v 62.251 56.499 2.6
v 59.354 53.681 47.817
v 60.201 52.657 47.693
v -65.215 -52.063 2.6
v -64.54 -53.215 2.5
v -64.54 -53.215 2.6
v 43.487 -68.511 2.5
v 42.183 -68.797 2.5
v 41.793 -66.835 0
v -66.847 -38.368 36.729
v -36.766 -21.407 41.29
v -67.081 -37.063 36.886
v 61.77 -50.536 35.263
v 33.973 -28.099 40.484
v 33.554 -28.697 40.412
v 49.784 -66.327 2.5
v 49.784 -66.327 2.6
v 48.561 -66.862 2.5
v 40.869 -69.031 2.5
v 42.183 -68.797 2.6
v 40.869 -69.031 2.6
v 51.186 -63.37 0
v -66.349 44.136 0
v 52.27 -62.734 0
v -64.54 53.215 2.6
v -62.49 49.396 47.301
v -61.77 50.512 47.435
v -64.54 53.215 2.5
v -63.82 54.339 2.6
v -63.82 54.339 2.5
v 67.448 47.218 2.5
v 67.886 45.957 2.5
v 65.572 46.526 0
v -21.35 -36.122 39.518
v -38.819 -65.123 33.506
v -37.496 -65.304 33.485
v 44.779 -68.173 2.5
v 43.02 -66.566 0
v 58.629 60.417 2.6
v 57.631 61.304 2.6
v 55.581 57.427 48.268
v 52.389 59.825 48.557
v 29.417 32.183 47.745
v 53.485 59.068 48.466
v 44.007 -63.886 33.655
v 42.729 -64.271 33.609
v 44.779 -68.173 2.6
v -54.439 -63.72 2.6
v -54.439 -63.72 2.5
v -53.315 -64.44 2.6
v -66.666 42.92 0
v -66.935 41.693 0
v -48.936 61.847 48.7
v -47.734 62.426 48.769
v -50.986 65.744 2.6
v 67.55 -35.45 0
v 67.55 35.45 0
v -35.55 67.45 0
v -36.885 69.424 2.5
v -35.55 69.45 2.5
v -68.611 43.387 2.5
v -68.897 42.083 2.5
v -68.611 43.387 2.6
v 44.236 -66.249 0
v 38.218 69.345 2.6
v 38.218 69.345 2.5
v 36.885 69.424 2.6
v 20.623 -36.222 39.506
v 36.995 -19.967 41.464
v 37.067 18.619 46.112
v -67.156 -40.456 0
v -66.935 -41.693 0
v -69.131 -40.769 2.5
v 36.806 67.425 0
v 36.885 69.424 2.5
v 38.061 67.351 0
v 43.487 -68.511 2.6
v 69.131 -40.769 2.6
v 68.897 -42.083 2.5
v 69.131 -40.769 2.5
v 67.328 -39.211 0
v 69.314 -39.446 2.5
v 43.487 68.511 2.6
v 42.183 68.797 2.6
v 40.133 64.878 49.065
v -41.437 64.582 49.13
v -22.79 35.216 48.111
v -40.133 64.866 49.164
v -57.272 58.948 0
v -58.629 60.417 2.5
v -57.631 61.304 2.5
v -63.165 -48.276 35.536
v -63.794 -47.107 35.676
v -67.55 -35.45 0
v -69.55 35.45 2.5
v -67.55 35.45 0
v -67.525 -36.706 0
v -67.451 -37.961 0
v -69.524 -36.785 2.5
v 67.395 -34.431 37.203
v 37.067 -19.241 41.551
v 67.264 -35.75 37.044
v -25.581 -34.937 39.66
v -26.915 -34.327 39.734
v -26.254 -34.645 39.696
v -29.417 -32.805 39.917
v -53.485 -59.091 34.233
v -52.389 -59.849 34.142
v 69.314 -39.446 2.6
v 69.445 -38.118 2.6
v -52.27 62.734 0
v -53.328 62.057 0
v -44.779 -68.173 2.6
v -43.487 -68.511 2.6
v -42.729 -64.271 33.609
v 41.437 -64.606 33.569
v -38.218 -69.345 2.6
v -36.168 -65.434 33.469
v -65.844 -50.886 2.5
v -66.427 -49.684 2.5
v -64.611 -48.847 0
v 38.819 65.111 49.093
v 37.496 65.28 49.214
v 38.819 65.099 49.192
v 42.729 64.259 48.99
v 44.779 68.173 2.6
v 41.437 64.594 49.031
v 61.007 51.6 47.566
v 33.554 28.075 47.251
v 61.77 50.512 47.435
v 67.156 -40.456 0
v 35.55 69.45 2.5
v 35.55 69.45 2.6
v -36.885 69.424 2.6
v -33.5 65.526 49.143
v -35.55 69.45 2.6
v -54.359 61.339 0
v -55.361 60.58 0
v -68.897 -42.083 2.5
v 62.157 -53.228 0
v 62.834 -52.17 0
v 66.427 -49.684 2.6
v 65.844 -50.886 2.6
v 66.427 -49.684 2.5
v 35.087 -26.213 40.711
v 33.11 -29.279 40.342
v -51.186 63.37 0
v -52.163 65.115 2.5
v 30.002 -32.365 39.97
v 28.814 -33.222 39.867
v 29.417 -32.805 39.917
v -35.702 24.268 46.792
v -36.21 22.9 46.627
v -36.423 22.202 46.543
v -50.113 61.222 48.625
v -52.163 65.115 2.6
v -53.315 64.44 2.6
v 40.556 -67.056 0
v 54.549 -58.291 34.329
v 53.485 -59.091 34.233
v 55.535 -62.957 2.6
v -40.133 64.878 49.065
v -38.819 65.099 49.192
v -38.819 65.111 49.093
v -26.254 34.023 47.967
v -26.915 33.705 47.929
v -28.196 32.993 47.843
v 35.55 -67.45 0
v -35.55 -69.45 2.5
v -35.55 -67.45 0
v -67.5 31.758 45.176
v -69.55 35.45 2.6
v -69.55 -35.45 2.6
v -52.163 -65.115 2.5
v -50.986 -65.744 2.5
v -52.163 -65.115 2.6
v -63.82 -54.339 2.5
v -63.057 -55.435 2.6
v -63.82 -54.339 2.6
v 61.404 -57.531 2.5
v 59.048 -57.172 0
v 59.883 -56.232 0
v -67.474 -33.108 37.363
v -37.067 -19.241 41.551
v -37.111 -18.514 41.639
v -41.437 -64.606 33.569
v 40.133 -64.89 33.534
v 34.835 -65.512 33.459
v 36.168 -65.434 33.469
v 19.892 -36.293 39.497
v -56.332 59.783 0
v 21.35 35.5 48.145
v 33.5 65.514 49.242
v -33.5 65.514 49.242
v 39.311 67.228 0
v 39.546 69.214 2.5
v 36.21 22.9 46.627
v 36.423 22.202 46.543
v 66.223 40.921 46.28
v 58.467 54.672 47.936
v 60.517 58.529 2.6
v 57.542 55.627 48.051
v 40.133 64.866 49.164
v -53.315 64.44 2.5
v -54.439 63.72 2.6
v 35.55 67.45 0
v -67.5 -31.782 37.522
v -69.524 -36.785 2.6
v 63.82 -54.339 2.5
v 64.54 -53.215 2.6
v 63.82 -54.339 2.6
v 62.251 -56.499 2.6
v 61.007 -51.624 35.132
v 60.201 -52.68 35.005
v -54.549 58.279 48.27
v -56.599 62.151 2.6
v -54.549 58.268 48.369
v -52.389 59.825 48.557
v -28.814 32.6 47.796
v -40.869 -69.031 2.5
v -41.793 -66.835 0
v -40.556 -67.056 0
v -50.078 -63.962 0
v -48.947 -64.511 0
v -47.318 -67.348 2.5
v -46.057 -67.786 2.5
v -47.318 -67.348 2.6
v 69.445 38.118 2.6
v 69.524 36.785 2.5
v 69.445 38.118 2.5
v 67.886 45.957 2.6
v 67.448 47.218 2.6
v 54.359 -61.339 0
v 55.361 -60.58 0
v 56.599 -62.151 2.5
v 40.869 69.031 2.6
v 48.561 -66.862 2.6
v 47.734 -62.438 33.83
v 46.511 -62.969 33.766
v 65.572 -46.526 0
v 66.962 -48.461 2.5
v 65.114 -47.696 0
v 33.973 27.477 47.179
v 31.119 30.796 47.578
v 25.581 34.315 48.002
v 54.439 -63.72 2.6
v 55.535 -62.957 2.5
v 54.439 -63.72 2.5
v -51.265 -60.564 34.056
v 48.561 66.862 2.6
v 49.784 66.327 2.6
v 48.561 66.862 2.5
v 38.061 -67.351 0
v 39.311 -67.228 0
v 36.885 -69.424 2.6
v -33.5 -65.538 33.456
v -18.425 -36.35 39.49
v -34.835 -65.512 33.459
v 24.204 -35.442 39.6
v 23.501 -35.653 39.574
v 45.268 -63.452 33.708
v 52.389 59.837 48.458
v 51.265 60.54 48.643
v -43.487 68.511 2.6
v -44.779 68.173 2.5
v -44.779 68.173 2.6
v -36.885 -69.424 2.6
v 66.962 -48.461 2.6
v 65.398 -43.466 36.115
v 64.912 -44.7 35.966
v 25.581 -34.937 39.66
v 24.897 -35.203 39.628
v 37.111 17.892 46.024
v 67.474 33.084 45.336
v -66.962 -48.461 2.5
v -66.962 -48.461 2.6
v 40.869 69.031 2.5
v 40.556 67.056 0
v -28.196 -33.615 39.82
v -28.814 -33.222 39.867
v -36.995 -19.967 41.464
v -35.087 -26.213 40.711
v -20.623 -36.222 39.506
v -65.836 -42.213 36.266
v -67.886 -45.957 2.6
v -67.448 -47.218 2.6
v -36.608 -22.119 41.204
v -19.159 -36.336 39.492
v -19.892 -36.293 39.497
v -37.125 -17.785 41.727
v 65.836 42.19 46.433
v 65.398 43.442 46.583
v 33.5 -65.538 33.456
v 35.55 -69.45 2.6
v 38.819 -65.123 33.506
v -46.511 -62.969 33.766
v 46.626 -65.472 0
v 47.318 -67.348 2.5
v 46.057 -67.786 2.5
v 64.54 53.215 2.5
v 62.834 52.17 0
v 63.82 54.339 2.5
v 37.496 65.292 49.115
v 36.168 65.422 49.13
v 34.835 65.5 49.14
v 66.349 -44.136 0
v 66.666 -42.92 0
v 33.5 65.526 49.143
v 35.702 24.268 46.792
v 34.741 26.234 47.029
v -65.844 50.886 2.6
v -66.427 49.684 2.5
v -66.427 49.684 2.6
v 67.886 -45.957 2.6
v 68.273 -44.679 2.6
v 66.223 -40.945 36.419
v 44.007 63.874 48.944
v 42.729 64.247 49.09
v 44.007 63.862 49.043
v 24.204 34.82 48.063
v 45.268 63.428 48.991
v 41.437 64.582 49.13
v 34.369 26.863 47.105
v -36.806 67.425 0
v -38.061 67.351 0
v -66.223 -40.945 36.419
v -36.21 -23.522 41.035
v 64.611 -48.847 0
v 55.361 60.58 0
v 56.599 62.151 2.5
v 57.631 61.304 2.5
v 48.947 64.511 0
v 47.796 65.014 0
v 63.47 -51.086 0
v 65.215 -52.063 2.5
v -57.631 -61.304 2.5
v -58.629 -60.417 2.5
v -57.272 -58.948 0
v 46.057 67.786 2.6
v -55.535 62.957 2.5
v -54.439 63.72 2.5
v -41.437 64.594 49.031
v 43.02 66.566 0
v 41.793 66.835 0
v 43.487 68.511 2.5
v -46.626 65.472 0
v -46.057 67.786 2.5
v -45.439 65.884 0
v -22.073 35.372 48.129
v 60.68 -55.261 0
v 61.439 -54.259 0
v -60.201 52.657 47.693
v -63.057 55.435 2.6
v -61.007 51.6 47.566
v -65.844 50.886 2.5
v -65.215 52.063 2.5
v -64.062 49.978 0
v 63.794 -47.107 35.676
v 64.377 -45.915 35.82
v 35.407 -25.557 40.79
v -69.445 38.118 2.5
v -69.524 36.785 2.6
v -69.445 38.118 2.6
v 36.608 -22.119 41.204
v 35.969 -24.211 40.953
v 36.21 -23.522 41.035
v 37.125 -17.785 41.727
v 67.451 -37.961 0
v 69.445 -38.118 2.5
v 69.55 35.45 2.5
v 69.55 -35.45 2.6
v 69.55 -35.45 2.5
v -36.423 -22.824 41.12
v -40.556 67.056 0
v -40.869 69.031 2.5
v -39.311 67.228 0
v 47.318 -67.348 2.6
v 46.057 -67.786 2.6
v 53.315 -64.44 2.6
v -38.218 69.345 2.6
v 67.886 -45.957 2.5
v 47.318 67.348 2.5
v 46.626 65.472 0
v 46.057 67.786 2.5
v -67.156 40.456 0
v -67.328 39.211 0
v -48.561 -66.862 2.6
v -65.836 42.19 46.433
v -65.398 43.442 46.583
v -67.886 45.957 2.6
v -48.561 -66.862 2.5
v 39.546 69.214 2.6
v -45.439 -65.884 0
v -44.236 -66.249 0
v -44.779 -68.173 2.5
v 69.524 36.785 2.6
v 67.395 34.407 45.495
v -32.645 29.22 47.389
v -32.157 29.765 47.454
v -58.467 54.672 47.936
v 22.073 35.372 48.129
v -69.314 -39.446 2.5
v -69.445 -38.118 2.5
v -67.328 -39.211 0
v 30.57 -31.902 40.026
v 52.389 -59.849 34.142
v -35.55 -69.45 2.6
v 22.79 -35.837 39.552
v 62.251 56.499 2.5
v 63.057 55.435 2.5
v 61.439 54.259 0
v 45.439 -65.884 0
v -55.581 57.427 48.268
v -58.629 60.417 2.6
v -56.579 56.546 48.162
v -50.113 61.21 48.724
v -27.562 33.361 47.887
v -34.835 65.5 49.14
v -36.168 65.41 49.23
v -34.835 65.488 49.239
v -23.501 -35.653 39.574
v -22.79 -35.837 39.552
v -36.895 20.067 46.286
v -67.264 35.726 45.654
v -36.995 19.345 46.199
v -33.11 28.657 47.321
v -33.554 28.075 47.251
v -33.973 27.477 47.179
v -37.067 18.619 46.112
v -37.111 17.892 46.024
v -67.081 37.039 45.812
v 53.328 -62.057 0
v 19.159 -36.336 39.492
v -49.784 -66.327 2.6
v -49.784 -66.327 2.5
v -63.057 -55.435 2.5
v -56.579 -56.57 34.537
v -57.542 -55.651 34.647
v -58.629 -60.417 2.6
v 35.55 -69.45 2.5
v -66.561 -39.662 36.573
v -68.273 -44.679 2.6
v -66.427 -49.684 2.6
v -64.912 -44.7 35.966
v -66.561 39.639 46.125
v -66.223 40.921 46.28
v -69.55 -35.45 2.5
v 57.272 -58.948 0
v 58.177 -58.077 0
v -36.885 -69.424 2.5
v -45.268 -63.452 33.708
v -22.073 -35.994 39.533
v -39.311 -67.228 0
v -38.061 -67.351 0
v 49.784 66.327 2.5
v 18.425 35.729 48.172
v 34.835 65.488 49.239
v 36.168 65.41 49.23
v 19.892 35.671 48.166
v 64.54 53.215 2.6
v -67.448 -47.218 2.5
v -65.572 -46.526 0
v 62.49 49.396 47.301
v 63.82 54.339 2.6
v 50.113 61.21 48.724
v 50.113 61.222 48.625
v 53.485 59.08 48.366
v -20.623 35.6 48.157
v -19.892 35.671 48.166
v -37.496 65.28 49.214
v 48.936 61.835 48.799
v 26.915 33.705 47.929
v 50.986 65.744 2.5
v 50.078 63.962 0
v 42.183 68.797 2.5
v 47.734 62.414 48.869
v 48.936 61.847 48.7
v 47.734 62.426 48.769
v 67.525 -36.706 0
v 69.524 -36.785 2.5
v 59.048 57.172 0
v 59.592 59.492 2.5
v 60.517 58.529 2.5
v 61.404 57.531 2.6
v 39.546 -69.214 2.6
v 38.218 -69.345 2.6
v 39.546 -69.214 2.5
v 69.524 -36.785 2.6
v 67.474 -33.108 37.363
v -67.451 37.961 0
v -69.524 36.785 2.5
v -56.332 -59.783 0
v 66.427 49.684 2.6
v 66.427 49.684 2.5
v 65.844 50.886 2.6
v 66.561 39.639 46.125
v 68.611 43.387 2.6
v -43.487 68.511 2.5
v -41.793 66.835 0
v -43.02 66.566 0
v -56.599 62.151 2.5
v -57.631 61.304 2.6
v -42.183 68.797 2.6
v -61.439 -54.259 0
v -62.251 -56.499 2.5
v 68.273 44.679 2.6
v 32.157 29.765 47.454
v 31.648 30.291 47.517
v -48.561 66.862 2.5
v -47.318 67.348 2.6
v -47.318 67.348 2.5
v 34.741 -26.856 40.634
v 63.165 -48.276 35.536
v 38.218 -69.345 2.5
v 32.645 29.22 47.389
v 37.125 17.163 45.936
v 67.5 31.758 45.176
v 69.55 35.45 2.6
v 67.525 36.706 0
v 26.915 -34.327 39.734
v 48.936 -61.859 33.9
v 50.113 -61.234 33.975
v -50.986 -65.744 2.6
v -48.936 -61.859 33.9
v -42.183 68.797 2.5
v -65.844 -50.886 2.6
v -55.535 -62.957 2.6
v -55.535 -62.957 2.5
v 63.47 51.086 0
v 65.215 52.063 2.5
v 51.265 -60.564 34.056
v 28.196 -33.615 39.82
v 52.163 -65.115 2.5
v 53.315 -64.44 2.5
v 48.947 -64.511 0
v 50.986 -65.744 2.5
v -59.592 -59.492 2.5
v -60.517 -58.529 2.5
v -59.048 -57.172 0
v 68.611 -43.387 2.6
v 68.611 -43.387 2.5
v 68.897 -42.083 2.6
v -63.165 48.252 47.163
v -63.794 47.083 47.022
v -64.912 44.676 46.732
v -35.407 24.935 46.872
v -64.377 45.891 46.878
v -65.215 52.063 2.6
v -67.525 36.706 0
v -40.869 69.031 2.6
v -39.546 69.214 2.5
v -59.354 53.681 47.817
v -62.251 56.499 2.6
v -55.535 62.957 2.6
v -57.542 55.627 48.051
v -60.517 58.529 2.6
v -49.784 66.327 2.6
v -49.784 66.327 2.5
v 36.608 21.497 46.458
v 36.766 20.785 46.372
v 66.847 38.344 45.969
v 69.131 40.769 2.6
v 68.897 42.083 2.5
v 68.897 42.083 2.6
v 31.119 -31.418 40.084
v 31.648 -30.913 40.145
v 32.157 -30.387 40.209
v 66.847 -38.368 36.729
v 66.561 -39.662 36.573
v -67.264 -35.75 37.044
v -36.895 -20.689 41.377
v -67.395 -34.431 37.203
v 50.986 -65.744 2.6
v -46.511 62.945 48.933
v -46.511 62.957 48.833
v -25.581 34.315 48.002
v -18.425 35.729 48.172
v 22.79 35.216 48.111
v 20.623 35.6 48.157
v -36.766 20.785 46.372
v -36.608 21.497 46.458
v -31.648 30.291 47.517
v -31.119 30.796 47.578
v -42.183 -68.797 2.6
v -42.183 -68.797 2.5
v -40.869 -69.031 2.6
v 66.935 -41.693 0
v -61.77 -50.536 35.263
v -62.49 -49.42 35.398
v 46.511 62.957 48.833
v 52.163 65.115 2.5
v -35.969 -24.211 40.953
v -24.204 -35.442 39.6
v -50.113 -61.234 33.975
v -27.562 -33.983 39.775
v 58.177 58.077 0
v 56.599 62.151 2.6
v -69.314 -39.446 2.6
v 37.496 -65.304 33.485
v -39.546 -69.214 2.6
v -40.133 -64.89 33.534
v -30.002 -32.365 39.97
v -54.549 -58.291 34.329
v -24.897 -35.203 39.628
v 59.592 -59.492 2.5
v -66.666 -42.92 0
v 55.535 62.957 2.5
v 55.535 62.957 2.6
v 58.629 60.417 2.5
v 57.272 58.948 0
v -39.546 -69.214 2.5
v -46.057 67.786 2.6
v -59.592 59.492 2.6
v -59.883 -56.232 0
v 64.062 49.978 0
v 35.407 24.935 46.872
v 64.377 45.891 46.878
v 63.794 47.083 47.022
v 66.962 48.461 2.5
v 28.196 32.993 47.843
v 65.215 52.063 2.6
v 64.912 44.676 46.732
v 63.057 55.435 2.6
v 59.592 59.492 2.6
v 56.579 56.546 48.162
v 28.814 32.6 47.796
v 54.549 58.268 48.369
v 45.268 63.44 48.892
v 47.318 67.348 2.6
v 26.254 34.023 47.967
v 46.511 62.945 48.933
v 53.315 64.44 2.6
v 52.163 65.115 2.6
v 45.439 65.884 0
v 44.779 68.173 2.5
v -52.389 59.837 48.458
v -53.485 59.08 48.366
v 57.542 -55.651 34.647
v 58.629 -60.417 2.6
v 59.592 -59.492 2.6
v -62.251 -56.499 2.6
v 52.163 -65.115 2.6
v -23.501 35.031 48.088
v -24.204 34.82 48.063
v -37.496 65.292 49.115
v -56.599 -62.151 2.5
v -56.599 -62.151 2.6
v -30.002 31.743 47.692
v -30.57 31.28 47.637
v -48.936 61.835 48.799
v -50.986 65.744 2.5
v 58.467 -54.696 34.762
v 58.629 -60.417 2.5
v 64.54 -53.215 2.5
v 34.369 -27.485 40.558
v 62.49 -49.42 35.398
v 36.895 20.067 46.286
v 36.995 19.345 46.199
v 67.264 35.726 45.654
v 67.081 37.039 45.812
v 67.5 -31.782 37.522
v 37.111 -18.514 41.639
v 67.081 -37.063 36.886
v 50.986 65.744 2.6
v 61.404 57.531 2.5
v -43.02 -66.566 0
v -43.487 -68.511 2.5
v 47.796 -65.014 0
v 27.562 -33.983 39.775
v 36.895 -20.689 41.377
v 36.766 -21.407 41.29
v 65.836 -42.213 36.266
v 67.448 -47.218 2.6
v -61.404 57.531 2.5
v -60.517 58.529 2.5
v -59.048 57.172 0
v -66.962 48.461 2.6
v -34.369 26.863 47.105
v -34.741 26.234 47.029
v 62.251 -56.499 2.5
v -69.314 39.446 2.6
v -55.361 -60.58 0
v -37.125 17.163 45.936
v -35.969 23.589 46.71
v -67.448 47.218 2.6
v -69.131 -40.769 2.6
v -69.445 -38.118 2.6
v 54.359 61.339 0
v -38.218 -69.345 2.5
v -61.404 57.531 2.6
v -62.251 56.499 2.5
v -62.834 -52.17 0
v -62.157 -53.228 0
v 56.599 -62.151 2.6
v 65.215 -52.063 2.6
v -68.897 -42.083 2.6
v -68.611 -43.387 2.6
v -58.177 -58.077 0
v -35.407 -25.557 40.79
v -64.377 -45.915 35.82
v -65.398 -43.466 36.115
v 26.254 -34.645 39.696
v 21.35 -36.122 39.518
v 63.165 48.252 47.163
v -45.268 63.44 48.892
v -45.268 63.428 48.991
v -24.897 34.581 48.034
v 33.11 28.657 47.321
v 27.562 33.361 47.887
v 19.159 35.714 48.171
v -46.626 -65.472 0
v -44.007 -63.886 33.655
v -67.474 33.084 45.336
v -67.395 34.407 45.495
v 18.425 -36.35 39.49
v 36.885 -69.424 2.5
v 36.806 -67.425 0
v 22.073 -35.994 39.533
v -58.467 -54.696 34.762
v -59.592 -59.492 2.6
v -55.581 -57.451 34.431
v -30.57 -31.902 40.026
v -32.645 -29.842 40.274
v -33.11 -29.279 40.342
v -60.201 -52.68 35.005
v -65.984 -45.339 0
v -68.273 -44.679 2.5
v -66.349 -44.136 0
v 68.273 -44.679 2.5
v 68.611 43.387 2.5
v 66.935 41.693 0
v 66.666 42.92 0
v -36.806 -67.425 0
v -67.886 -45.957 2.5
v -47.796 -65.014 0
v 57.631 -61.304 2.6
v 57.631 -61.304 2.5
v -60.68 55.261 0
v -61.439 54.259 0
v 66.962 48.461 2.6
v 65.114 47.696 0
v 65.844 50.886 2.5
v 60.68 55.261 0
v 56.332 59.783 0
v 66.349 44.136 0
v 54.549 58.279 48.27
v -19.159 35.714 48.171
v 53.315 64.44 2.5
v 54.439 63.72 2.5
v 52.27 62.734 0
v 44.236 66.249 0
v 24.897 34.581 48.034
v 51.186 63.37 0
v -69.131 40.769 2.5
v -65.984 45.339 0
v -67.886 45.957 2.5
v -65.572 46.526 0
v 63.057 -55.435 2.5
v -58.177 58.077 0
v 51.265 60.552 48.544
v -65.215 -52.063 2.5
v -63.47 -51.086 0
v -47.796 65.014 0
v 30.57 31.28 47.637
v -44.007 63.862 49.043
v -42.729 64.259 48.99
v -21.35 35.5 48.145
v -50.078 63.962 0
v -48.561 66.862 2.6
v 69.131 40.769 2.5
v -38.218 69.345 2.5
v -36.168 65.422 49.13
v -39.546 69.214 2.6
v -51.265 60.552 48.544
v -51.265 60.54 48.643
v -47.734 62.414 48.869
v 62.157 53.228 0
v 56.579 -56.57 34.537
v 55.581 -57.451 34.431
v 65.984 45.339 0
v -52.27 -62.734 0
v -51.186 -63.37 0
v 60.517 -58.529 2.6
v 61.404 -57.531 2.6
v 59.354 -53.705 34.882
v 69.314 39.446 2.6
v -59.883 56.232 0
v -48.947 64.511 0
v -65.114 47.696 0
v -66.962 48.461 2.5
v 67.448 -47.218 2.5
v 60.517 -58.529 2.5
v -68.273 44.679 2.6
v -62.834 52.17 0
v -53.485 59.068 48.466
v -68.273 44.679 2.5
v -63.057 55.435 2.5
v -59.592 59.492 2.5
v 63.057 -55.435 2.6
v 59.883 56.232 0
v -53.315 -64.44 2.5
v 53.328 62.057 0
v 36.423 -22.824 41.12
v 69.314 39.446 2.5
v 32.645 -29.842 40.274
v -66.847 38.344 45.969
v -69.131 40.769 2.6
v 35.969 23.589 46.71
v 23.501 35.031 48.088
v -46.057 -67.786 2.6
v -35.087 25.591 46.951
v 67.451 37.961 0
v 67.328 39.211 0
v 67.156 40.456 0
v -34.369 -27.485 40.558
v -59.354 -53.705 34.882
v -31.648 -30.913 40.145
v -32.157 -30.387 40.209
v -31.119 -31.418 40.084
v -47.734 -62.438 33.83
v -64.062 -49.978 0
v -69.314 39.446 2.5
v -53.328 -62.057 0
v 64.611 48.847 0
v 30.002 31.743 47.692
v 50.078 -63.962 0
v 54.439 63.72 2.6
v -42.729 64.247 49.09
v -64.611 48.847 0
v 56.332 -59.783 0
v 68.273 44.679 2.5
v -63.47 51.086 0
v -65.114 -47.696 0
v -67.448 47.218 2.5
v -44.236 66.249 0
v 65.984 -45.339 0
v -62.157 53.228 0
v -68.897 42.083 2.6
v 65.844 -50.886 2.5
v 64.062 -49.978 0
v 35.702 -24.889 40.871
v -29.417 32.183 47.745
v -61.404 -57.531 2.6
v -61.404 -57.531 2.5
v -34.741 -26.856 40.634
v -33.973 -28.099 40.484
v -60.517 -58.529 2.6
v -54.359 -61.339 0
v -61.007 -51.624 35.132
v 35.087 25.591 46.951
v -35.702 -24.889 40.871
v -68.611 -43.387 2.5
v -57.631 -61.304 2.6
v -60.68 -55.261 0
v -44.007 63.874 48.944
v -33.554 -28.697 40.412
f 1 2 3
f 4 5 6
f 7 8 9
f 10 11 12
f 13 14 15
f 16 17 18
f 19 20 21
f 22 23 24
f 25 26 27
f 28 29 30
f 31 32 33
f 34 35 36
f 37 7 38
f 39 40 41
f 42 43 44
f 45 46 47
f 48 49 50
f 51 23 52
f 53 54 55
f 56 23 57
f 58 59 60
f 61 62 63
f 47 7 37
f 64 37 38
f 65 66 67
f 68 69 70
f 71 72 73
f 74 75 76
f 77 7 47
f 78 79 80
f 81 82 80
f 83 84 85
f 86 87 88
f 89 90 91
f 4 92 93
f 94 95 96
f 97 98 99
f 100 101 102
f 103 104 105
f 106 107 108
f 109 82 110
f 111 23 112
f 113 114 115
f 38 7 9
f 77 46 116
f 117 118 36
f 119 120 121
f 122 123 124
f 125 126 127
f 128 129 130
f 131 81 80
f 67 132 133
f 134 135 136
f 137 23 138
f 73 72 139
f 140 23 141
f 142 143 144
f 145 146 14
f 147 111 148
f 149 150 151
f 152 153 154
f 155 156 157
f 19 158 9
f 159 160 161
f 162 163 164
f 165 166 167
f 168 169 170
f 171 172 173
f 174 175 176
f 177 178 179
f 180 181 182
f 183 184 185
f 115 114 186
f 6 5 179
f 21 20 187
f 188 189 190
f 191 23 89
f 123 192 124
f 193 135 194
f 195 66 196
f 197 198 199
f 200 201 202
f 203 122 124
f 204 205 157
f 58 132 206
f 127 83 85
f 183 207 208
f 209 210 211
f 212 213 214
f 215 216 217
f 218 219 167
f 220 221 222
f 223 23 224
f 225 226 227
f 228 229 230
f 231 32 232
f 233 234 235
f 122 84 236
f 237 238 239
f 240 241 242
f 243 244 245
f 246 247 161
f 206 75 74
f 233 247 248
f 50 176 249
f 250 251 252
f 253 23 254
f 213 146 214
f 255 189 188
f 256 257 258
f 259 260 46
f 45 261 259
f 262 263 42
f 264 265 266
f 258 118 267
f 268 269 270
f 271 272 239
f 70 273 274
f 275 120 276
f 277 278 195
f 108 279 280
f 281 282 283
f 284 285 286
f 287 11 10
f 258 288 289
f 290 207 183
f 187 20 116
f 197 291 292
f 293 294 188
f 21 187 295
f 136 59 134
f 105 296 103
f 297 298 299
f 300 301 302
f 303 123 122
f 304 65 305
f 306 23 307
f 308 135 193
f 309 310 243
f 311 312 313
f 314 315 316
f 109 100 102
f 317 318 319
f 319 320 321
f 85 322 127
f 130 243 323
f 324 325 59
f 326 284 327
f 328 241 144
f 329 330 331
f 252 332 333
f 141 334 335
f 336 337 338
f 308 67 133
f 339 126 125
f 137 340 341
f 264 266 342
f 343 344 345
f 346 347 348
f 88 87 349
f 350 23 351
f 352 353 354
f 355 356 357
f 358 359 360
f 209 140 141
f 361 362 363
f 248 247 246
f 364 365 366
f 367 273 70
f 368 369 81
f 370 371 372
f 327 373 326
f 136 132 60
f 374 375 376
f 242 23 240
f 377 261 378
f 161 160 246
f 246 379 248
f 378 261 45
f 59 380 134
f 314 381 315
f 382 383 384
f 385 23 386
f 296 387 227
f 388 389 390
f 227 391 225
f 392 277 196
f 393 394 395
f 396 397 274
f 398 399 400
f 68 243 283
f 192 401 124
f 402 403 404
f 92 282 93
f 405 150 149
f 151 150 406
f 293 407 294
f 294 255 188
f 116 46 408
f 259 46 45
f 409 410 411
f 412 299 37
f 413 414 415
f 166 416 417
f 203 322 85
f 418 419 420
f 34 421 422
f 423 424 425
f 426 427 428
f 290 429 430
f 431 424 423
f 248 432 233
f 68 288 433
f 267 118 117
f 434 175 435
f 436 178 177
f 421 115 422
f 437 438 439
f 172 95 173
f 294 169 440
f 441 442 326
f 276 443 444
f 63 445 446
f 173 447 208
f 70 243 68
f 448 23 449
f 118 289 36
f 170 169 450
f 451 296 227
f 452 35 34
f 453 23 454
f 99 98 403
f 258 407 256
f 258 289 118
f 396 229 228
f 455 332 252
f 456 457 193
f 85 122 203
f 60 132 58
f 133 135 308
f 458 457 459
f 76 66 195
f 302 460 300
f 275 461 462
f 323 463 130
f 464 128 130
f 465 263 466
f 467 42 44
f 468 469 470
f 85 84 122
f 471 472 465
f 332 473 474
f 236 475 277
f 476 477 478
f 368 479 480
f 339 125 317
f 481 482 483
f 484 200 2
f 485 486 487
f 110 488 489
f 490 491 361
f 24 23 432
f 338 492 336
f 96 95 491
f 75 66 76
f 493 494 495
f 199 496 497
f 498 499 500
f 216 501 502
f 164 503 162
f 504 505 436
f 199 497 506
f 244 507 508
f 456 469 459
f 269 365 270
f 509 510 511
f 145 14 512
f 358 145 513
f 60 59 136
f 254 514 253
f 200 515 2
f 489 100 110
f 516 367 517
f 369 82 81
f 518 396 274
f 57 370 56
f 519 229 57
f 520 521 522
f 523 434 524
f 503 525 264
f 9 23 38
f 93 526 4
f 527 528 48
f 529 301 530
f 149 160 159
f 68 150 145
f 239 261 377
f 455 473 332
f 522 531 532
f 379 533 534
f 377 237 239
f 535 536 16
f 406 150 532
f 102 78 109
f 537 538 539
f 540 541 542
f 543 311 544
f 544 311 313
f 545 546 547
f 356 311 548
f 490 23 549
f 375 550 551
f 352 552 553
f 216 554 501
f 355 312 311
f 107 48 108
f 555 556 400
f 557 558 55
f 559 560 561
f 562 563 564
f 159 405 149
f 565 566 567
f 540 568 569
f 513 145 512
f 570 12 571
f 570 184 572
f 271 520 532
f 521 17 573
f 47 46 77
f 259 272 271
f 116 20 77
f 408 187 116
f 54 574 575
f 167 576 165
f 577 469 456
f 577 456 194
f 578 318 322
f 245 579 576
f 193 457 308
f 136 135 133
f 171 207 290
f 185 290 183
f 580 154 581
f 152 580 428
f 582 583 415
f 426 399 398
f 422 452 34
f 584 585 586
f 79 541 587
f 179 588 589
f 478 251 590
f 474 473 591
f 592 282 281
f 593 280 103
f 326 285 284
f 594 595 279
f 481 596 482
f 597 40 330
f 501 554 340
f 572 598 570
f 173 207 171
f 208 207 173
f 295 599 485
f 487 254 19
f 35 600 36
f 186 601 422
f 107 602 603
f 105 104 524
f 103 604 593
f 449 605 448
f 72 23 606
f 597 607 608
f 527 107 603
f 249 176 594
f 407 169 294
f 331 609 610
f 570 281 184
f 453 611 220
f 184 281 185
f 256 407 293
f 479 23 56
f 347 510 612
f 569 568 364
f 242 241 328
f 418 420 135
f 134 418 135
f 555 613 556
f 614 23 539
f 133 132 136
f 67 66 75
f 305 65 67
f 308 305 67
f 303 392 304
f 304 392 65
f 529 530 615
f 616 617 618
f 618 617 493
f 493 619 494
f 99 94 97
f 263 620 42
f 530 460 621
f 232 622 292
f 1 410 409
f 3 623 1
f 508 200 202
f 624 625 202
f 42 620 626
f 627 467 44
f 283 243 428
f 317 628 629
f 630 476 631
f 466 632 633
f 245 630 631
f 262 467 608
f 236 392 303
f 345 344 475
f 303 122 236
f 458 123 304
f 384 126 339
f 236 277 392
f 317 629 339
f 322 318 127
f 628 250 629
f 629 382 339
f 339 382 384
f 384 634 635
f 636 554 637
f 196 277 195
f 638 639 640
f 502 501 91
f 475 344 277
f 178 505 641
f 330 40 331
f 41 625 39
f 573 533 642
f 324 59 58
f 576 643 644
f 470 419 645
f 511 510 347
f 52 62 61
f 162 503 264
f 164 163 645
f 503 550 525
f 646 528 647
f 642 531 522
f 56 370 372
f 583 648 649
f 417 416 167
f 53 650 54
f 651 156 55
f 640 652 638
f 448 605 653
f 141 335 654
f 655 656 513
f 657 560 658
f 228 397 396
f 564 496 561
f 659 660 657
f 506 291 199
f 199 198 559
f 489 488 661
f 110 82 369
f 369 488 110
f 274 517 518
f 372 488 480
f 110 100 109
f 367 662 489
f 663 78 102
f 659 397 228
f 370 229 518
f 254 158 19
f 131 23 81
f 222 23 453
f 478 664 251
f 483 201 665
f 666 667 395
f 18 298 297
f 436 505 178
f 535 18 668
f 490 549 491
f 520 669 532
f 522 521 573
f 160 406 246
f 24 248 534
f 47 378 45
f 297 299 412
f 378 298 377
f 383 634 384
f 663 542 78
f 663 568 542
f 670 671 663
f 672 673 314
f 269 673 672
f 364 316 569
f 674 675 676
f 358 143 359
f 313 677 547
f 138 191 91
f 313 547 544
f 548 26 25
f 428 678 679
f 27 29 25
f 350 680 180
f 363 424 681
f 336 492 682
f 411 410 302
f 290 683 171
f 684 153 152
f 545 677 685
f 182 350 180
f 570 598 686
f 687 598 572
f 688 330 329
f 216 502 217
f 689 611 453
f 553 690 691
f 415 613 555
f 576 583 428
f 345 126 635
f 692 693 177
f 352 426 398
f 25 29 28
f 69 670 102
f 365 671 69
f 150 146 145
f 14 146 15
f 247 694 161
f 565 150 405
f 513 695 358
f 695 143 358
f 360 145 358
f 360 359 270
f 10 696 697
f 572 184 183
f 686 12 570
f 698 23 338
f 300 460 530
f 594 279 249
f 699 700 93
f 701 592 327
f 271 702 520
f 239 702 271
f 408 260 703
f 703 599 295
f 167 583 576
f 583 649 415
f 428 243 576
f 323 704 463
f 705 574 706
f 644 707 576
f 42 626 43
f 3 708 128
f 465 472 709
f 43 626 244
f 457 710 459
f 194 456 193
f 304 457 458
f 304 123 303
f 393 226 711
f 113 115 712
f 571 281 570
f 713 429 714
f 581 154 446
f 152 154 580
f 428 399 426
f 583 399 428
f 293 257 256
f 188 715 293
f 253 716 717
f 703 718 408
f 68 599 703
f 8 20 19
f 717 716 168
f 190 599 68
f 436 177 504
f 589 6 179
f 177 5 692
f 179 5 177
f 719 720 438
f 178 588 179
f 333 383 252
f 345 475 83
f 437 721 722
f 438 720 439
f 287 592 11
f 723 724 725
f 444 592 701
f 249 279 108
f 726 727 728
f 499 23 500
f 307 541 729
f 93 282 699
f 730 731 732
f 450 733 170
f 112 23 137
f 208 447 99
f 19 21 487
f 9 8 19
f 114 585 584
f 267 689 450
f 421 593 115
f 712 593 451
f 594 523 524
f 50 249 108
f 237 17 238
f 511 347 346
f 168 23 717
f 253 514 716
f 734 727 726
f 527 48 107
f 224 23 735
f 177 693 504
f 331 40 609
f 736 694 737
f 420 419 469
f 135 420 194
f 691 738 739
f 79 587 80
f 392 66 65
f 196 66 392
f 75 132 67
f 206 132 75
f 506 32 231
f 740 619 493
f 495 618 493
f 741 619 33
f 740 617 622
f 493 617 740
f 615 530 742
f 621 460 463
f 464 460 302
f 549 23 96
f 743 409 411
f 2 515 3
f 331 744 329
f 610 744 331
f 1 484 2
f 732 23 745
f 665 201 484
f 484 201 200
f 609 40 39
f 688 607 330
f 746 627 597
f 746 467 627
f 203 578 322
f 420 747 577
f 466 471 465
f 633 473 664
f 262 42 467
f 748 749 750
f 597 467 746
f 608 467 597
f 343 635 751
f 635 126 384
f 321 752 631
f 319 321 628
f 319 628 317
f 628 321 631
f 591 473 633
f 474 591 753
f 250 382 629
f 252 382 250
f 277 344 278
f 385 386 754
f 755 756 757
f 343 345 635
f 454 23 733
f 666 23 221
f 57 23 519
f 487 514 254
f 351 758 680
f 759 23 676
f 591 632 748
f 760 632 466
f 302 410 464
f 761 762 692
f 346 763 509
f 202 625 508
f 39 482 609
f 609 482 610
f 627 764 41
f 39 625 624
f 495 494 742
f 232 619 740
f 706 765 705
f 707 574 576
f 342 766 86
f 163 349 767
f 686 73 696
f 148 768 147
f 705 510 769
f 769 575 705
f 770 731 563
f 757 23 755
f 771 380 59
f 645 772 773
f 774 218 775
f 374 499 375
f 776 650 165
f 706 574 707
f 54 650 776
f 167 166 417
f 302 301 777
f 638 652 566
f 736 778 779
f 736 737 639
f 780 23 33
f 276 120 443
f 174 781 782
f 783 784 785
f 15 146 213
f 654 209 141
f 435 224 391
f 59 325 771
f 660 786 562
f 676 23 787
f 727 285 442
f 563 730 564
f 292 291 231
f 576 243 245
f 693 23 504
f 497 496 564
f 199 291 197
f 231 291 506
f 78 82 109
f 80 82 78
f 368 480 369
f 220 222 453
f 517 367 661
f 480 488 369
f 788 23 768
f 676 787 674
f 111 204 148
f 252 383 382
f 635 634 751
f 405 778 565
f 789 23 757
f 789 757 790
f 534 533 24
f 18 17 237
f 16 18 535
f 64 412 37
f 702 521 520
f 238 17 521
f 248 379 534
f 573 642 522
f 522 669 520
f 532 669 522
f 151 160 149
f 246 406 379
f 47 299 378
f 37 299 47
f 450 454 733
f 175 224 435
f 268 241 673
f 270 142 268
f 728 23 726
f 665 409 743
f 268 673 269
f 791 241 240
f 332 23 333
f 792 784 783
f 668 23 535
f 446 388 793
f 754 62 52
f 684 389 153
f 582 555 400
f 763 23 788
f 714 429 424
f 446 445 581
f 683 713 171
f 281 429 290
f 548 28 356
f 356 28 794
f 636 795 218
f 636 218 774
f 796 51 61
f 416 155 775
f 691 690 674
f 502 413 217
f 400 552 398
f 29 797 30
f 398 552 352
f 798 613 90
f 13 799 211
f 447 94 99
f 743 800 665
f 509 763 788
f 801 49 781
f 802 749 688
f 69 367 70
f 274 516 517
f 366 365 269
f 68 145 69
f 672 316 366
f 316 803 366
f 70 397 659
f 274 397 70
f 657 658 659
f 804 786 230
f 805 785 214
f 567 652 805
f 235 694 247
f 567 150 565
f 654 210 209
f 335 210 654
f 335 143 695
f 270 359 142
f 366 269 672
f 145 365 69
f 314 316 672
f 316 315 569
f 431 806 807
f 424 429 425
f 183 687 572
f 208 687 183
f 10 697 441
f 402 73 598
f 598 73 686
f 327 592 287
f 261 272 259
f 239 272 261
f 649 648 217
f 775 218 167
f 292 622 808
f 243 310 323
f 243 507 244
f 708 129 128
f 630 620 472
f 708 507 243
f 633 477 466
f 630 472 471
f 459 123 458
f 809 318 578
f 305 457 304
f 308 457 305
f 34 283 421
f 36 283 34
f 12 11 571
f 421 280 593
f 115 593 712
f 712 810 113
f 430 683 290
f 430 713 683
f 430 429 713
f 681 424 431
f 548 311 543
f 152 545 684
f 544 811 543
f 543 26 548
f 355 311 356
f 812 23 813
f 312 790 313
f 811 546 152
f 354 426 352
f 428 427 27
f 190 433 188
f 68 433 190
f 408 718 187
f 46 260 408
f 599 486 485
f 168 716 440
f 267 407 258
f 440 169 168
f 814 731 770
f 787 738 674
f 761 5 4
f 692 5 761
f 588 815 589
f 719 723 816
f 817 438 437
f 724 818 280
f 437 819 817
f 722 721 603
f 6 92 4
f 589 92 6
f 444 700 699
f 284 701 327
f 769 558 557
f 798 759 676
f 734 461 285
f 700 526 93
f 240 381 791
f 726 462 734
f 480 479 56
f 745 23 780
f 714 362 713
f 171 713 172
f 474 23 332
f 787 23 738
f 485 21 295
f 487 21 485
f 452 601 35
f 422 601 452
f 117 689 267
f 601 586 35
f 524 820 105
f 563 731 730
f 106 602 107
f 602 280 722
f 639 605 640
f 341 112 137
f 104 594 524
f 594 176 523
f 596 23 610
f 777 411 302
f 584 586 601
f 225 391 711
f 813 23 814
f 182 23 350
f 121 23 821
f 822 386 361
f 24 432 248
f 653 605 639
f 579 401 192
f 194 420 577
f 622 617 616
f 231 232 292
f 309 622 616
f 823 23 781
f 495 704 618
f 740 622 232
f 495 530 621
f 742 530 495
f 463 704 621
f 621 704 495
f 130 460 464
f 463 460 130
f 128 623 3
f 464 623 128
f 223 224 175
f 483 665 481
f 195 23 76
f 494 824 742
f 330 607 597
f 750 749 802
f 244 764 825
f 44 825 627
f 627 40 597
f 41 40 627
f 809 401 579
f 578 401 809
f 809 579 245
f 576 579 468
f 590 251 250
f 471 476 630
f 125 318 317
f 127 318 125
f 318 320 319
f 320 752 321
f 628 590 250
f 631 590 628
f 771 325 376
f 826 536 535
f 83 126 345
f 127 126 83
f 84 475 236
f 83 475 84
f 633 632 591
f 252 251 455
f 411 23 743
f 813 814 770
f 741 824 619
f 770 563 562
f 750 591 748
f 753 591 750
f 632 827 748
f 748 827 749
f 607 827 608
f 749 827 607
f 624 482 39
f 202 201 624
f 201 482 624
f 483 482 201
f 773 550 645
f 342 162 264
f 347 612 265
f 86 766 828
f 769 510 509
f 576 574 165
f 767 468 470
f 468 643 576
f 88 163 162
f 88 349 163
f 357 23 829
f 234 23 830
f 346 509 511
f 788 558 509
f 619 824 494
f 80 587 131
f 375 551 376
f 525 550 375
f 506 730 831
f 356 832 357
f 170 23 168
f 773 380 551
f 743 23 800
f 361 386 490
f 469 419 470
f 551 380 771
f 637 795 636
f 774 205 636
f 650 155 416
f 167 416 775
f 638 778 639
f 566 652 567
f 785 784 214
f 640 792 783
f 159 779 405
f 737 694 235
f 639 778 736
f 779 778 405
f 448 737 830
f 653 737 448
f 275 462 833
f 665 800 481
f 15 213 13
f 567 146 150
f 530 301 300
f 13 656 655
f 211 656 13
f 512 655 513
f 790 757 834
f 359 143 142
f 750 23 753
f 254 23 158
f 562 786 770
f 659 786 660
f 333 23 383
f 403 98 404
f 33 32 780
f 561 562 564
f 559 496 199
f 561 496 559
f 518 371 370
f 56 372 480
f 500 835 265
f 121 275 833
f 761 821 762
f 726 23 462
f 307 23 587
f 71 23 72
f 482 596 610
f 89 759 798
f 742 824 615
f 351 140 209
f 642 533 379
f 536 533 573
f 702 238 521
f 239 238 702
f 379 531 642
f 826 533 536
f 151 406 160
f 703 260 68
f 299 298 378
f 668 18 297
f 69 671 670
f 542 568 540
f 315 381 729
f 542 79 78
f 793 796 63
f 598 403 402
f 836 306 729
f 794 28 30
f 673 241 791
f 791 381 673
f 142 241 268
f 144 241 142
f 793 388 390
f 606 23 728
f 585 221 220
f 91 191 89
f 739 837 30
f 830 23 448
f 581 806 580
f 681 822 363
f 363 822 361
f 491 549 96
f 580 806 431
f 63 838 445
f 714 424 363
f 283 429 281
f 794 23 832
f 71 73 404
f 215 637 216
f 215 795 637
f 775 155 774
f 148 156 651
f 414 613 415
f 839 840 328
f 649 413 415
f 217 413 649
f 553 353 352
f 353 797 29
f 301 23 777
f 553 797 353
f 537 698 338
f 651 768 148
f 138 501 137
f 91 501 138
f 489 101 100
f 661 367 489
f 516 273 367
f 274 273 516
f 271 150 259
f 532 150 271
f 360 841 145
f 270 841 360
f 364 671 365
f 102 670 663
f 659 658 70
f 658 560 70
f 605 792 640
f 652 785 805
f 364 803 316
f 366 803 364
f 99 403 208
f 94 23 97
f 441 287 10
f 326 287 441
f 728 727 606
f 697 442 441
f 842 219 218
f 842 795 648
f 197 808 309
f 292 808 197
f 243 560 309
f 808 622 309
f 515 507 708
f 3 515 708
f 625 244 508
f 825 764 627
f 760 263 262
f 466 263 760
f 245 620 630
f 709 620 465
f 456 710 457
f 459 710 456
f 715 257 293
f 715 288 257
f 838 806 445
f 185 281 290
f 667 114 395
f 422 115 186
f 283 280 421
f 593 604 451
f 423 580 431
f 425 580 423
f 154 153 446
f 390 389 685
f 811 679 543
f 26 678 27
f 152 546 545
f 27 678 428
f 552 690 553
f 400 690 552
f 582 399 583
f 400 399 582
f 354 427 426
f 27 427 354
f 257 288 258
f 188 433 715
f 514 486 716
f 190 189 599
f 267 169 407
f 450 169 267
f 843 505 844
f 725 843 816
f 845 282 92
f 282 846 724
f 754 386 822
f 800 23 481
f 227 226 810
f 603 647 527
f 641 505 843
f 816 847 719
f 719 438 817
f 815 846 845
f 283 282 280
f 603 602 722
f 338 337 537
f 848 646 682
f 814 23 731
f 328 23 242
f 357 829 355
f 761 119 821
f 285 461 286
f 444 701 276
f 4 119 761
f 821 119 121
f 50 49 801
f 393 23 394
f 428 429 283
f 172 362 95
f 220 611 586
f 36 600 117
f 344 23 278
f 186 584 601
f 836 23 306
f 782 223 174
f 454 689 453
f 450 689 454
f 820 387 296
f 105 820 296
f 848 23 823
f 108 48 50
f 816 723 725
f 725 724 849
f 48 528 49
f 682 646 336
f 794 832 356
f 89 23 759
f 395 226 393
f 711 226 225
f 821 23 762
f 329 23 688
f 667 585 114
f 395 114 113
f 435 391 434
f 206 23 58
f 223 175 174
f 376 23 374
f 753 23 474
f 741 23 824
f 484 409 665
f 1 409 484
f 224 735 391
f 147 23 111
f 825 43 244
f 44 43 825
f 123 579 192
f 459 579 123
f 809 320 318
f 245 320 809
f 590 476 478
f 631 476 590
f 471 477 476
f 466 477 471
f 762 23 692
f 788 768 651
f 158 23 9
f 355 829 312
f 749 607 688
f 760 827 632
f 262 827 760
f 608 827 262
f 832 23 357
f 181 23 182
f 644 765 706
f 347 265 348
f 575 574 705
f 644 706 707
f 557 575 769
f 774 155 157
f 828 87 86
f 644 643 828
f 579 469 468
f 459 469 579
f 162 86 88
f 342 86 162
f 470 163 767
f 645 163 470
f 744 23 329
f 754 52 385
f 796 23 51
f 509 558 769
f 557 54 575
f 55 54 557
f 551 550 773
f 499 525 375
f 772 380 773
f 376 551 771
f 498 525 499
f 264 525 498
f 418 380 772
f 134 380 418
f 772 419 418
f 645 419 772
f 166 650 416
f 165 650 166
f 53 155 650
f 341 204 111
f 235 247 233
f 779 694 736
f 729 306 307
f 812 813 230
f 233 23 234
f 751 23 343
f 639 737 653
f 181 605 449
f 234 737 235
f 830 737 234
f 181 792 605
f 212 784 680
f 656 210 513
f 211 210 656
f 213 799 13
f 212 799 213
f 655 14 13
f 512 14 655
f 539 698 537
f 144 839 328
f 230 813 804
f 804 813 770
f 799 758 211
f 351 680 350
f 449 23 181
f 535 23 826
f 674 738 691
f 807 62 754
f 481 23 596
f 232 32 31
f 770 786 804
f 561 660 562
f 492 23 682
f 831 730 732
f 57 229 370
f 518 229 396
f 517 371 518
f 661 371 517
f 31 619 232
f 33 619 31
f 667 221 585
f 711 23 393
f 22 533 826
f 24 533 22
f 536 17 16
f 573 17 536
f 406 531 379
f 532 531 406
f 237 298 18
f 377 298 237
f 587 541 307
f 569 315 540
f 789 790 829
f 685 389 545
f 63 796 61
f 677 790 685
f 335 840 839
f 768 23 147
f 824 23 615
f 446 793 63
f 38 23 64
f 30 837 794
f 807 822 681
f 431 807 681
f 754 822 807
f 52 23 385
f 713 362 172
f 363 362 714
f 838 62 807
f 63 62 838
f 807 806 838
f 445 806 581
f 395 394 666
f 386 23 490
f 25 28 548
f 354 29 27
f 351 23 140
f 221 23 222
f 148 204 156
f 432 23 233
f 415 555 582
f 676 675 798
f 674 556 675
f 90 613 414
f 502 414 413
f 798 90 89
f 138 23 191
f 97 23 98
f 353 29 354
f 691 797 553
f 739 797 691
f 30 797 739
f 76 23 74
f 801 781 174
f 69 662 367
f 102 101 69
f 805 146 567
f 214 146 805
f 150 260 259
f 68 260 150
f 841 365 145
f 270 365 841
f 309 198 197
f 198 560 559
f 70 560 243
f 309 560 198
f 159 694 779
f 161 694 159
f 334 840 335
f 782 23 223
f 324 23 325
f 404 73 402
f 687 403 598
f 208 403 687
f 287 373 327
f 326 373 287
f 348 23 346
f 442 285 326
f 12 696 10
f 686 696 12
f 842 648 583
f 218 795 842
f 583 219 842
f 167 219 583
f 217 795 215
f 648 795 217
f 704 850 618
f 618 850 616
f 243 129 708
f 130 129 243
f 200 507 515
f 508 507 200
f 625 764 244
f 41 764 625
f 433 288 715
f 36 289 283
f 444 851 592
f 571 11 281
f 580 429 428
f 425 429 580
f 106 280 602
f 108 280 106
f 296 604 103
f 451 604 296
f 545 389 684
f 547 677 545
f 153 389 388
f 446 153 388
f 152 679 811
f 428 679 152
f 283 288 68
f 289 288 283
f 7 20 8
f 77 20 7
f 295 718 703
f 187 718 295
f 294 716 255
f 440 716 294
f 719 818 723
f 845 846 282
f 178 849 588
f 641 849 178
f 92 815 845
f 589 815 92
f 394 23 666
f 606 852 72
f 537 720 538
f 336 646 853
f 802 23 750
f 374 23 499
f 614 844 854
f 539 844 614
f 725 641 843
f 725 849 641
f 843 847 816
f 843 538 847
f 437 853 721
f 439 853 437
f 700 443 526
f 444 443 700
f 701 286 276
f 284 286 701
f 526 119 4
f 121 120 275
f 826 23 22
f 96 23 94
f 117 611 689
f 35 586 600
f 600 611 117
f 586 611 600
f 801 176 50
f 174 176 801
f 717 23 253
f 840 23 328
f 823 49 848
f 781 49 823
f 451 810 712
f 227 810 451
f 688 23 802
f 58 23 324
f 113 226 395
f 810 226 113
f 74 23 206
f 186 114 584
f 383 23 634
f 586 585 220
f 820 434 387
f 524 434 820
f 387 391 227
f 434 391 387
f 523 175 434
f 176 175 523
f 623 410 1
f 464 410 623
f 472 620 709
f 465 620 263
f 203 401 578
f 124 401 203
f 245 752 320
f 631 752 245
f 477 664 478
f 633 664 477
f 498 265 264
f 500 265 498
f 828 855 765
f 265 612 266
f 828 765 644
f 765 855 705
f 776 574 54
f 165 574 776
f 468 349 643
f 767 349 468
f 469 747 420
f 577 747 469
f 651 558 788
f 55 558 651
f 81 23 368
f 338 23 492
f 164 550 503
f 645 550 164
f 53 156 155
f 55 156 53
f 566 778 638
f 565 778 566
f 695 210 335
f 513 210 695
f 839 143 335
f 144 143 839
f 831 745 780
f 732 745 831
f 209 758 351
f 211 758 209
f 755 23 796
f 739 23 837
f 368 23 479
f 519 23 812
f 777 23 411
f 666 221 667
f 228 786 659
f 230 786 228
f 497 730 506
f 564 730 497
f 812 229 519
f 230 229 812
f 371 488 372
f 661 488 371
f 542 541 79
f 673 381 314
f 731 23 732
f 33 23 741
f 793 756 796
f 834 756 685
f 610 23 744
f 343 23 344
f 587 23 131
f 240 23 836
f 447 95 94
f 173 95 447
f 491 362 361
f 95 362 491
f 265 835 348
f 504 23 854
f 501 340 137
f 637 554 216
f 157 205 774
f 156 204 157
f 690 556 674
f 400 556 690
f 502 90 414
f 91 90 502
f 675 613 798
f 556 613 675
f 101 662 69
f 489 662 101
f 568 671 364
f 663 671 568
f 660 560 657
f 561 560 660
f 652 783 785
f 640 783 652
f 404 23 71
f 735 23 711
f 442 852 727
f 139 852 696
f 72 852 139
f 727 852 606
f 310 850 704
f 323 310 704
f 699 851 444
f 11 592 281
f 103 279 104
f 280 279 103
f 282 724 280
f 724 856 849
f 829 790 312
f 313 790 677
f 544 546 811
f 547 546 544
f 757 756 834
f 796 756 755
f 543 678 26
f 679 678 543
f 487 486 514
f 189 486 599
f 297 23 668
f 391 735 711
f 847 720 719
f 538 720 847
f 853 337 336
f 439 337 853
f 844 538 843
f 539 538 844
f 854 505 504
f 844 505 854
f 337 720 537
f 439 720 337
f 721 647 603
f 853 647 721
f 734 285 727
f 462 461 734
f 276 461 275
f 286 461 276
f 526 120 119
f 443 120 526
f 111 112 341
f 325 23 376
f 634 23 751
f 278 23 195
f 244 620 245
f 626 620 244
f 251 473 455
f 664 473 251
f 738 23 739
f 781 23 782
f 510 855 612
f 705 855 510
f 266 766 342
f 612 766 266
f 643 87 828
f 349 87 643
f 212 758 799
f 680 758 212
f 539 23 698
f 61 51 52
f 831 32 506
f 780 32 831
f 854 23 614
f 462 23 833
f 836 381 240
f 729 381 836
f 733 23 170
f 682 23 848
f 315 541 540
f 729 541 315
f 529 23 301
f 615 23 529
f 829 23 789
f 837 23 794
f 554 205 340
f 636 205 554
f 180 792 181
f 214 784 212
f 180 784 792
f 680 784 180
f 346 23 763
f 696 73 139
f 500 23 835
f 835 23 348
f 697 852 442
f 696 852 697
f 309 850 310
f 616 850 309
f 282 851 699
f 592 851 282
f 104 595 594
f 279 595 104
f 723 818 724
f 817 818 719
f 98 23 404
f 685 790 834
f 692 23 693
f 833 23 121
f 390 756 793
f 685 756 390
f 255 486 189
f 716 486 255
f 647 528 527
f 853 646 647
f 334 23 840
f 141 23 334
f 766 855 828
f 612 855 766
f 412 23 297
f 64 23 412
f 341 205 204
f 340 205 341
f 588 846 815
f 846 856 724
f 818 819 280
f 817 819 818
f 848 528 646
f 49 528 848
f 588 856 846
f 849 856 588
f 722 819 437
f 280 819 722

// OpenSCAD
// eero_pro6.scad
// Reference model of the eero Pro 6, built from measured dimensions.
// This is the GROUND TRUTH the mount will be designed around.
//
// FORM: the top is the base outline projected upward — same rounded corners —
// scaled in slightly (taper), sitting on a plane that tilts up toward the back
// and bulges with a slight dome.
//
// Axes: X = side-to-side, Y = front(-Y) / back(+Y), Z = up. Base sits on z=0.
// Wiring (power + ethernet) exits the BACK (+Y).
//
// Preview:  openscad -o eero_pro6.png --render --viewall --autocenter \
//             --imgsize=950,850 --colorscheme=Tomorrow eero_pro6.scad

$fn = 160;

/* ---------- Measured dimensions ---------- */
// Base (flat, rounded corners)
base_x = 139.1;   // side-to-side
base_y = 138.9;   // front-to-back
base_r = 34;      // corner radius (from 168.3 mm / 6-5/8" corner-to-corner)

// Base bevel (chamfer around the bottom edge)
bevel_h     = 2.5;
bevel_inset = 2.0;

// Top: same rounded corners as the base, projected up and scaled in (taper)
top_x = 135;      // side-to-side
top_y = 132;      // front-to-back

// Top-surface heights (base to top) used to set the tilt and dome
h_front_mid = 33.3;
h_back_mid  = 49.2;
h_side_mid  = 42.3;   // for reference
dome_crown  = 2.5;    // gentle center bulge above the tilted plane

/* ---------- Derived ---------- */
tilt_deg = atan2(h_back_mid - h_front_mid, top_y);   // front-low / back-high tilt
top_z    = (h_front_mid + h_back_mid) / 2;           // height of the tilt axis (y=0)

/* ---------- Helpers ---------- */
module rrect(x, y, r) { offset(r = r) square([x - 2*r, y - 2*r], center = true); }

// Top cap: the top rounded-rect with a slight central dome, same corner radius.
module top_cap() {
    hull() {
        linear_extrude(0.1) rrect(top_x, top_y, base_r);
        translate([0, 0, dome_crown])
            linear_extrude(0.1) rrect(top_x*0.55, top_y*0.55, base_r*0.55);
    }
}

/* ---------- Model ---------- */
module eero_pro6() {
    hull() {
        // beveled flat base
        linear_extrude(0.1)
            rrect(base_x - 2*bevel_inset, base_y - 2*bevel_inset, base_r - bevel_inset);
        translate([0, 0, bevel_h]) linear_extrude(0.1) rrect(base_x, base_y, base_r);

        // same-cornered top, scaled in, tilted up toward the back, slightly domed
        translate([0, 0, top_z]) rotate([tilt_deg, 0, 0]) top_cap();
    }
}

eero_pro6();
